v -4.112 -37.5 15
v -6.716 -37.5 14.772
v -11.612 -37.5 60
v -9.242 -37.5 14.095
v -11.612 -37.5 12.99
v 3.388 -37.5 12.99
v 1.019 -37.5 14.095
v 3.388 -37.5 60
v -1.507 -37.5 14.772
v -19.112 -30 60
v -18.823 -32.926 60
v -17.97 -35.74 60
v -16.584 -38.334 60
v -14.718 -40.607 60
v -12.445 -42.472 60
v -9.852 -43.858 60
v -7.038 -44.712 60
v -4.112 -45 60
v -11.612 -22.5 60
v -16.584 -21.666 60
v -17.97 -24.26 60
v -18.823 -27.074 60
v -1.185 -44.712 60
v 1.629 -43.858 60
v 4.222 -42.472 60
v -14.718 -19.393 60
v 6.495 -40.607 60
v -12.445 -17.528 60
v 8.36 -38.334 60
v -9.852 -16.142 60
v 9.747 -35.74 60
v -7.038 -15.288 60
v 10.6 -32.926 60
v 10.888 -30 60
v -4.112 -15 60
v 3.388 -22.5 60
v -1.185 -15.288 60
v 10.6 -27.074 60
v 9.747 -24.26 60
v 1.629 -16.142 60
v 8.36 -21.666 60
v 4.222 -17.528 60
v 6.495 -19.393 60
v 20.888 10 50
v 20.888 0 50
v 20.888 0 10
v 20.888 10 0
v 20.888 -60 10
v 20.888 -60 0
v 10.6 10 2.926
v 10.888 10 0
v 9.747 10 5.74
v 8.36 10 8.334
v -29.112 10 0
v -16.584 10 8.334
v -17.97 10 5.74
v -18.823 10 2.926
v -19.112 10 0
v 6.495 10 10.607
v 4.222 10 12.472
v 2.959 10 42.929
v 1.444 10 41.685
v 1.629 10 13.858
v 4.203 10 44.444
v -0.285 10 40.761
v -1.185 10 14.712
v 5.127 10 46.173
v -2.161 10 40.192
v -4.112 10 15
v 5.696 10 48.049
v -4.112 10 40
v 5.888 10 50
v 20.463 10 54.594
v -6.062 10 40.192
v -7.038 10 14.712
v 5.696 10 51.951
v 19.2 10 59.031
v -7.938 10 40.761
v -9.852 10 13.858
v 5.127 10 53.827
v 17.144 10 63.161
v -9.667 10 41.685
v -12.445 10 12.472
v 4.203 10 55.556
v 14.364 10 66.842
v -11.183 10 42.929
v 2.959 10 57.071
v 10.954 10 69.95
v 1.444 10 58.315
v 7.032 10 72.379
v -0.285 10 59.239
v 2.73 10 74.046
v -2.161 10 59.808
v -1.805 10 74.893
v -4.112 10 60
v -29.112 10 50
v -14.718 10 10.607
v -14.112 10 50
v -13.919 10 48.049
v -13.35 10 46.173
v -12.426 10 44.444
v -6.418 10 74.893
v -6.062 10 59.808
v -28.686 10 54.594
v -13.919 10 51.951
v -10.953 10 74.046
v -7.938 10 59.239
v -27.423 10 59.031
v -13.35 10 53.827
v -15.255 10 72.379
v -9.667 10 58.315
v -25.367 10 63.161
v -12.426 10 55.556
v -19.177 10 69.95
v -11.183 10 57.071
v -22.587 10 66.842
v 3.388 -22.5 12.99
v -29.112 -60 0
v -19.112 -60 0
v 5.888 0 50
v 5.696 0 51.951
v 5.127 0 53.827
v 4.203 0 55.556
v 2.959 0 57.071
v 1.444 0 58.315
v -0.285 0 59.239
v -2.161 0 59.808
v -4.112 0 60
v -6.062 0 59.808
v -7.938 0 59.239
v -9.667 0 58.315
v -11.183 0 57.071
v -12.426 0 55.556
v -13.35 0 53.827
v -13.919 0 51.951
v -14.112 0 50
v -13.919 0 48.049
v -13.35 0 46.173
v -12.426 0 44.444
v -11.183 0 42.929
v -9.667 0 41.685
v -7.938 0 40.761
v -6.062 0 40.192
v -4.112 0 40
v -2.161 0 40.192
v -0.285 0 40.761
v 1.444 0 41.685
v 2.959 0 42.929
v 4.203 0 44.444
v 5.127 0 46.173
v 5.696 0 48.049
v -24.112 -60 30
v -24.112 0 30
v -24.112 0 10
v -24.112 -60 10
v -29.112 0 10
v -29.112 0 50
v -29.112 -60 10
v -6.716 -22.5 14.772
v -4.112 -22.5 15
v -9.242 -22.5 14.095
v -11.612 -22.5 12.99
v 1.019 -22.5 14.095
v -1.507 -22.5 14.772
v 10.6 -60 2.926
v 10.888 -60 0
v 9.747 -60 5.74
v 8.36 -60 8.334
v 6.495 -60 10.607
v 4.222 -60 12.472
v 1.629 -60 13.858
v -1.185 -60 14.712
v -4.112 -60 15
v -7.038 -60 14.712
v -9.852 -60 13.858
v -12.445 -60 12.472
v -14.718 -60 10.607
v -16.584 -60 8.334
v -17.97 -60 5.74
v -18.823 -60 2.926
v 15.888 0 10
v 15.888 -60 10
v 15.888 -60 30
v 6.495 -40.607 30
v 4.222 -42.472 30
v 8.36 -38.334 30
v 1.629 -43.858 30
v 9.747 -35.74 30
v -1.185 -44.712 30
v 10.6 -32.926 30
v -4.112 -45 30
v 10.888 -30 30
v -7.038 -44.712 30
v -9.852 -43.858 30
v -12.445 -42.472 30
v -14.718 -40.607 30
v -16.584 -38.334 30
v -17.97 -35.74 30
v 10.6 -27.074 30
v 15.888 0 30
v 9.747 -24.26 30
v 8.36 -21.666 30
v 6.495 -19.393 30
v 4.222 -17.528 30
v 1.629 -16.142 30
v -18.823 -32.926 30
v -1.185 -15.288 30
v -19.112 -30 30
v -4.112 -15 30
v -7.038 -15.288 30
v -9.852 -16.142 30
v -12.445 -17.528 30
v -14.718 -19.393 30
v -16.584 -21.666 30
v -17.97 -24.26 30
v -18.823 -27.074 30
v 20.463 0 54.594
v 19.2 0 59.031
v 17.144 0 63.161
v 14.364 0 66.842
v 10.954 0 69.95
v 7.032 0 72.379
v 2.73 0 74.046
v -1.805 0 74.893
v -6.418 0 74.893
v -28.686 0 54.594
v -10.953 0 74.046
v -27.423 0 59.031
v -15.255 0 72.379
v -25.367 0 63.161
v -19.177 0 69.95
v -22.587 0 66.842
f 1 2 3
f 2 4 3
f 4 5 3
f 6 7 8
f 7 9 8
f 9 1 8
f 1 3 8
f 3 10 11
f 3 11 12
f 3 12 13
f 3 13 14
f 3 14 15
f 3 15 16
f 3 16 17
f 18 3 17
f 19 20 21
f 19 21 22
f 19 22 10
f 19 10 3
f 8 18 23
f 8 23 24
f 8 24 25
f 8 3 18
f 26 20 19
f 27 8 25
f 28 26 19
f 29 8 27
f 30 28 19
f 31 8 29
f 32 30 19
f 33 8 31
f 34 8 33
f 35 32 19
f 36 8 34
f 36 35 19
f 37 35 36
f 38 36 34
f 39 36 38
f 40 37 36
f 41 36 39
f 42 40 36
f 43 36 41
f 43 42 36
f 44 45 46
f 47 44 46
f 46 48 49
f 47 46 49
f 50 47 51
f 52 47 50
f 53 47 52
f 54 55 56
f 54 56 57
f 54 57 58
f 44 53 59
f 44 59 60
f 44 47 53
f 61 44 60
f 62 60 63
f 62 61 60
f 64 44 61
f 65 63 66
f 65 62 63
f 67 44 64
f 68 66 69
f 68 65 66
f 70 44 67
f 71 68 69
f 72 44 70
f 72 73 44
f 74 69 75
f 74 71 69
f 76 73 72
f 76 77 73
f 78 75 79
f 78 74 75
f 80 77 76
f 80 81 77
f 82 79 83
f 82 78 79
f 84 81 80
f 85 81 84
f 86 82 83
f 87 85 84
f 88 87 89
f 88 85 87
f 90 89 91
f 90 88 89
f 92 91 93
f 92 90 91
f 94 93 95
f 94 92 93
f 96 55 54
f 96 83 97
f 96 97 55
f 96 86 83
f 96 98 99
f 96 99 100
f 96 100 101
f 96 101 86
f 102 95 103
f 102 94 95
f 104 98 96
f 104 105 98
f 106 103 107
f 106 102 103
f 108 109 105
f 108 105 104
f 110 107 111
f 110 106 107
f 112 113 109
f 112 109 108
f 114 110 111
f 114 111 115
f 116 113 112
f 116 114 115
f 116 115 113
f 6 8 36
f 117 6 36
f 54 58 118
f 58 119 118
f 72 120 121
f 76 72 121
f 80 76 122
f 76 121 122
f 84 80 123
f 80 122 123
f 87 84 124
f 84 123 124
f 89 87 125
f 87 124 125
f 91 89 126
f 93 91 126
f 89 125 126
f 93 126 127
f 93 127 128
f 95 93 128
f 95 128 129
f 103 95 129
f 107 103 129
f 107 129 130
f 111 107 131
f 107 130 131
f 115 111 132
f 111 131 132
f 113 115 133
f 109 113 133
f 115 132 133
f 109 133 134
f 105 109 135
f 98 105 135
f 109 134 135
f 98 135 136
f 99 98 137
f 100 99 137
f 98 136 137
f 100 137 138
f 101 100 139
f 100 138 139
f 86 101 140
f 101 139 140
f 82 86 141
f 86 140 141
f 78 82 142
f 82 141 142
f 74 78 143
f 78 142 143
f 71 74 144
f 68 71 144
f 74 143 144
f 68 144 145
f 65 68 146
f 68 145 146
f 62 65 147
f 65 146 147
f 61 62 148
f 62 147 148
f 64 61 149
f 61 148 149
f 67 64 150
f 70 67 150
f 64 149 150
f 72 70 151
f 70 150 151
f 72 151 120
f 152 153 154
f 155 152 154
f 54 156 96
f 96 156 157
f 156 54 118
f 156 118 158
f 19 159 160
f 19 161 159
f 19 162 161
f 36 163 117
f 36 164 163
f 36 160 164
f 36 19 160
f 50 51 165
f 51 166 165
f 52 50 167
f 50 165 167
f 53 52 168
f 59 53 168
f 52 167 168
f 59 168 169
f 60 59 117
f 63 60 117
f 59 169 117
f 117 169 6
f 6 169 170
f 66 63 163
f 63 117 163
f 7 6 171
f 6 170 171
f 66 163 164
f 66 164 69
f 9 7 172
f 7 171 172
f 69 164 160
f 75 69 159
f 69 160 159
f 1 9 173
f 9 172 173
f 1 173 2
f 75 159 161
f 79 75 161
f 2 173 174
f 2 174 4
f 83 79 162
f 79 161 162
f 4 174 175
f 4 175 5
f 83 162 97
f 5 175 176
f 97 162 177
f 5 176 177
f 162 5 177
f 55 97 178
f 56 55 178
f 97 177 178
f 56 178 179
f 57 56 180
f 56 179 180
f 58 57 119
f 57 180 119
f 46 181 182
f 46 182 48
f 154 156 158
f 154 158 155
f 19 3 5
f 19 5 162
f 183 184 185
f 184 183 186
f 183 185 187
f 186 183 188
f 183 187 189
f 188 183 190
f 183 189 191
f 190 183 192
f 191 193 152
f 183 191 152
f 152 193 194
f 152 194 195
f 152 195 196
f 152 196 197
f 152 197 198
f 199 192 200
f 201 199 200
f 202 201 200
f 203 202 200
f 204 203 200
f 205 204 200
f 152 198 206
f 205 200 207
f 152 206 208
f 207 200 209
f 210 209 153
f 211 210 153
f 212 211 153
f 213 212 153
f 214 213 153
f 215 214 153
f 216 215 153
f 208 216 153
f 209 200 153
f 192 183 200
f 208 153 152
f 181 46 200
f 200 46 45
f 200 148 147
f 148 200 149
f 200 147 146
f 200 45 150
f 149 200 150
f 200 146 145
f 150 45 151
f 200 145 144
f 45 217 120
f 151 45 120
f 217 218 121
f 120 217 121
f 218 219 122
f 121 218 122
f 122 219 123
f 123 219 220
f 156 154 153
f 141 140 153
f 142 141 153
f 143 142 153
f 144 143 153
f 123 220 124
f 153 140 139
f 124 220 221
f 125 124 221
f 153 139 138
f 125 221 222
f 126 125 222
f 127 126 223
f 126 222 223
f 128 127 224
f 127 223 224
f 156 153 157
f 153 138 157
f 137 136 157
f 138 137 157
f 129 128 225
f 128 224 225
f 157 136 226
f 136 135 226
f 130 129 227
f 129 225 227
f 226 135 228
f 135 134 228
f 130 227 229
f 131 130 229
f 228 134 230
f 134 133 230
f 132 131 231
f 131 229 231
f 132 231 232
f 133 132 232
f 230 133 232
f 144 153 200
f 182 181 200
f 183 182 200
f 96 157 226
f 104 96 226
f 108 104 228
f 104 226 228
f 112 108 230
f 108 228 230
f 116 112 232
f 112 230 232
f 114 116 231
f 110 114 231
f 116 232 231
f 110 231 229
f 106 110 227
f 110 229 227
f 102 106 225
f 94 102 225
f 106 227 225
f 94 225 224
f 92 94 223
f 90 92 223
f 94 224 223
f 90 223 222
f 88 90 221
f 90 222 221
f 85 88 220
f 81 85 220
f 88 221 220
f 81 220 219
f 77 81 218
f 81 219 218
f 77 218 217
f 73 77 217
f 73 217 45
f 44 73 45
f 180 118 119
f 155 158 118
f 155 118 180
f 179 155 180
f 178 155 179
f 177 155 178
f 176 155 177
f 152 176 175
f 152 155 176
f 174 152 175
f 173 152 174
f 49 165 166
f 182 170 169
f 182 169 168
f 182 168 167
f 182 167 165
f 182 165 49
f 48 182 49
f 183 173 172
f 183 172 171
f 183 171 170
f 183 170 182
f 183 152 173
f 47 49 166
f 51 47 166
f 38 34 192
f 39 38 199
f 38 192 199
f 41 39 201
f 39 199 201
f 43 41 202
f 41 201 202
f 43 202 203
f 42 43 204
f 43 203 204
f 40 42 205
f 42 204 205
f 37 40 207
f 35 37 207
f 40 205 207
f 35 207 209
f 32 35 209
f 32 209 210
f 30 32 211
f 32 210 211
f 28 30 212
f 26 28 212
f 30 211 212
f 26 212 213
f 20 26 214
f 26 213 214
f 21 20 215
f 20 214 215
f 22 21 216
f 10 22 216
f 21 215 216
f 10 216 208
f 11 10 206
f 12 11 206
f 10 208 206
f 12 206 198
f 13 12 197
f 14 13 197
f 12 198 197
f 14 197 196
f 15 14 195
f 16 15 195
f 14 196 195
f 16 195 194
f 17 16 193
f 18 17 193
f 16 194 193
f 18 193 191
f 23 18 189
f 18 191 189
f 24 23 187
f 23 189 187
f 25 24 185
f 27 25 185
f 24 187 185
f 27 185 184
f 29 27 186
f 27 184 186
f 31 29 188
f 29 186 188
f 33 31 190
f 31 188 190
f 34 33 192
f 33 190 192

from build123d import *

# Parameters (mm, degrees)
F0_W     = 5
F0_H     = 10
F1_DEPTH = 60
F3_DEPTH = 10
F4_R     = 15
F5_DEPTH = 30
F6_W     = 15
F6_H     = 15
F7_DEPTH = 70


with BuildPart() as f1:
    # F0 (on Front) → F1 (new body)
    with BuildSketch(Plane.XZ):
        with Locations((-26.611573, 5)):
            Rectangle(F0_W, F0_H)
        with Locations((18.388427, 5)):
            Rectangle(F0_W, F0_H)
        with BuildLine():
            Line((10.888427, 0), (15.888427, 0))
            Line((15.888427, 0), (15.888427, 10))
            Line((15.888427, 10), (15.888427, 30))
            Line((15.888427, 30), (-24.111573, 30))
            Line((-24.111573, 30), (-24.111573, 10))
            Line((-24.111573, 10), (-24.111573, 0))
            Line((-24.111573, 0), (-19.111573, 0))
            ThreePointArc((-19.111573, 0), (-4.111573, 15), (10.888427, 0))
        make_face()
    extrude(amount=F1_DEPTH)

    # F2 (on face) → F3 (join)
    with BuildSketch(Plane(origin=(0, 0, 0), x_dir=(-1, 0, 0), z_dir=(0, 1, 0))):
        with BuildLine():
            Line((-20.888427, 10), (-20.888427, 0))
            Line((-20.888427, 0), (-10.888427, 0))
            ThreePointArc((-10.888427, 0), (4.111573, 15), (19.111573, 0))
            Line((19.111573, 0), (29.111573, 0))
            Line((29.111573, 0), (29.111573, 10))
            Line((29.111573, 10), (24.111573, 10))
            Line((24.111573, 10), (24.111573, 30))
            Line((24.111573, 30), (19.111573, 30))
            ThreePointArc((19.111573, 30), (4.111573, 25), (-10.888427, 30))
            Line((-10.888427, 30), (-15.888427, 30))
            Line((-15.888427, 30), (-15.888427, 10))
            Line((-15.888427, 10), (-20.888427, 10))
        make_face()
        with BuildLine():
            Line((-20.888427, 50), (-20.888427, 10))
            Line((-20.888427, 10), (-15.888427, 10))
            Line((-15.888427, 10), (-15.888427, 30))
            Line((-15.888427, 30), (-10.888427, 30))
            ThreePointArc((-10.888427, 30), (-18.249106, 38.81966), (-20.888427, 50))
        make_face()
        with BuildLine():
            Line((29.111573, 10), (29.111573, 50))
            ThreePointArc((29.111573, 50), (26.472253, 38.81966), (19.111573, 30))
            Line((19.111573, 30), (24.111573, 30))
            Line((24.111573, 30), (24.111573, 10))
            Line((24.111573, 10), (29.111573, 10))
        make_face()
        with BuildLine():
            Line((19.111573, 30), (-10.888427, 30))
            ThreePointArc((-10.888427, 30), (4.111573, 25), (19.111573, 30))
        make_face()
        with BuildLine():
            ThreePointArc((29.111573, 50), (4.111573, 75), (-20.888427, 50))
            Line((-20.888427, 50), (-5.888427, 50))
            ThreePointArc((-5.888427, 50), (4.111573, 60), (14.111573, 50))
            Line((14.111573, 50), (29.111573, 50))
        make_face()
        with BuildLine():
            Line((-5.888427, 50), (-20.888427, 50))
            ThreePointArc((-20.888427, 50), (-18.249106, 38.81966), (-10.888427, 30))
            Line((-10.888427, 30), (19.111573, 30))
            ThreePointArc((19.111573, 30), (26.472253, 38.81966), (29.111573, 50))
            Line((29.111573, 50), (14.111573, 50))
            ThreePointArc((14.111573, 50), (4.111573, 40), (-5.888427, 50))
        make_face()
    extrude(amount=F3_DEPTH)

    # F4 (on face) → F5 (join)
    with BuildSketch(Plane.XY.offset(30)):
        with Locations((-4.111573, -30)):
            Circle(F4_R)
    extrude(amount=F5_DEPTH)

    # F6 (on face) → F7 (cut)
    with BuildSketch(Plane.XY.offset(60)):
        with Locations((-4.111573, -30)):
            Rectangle(F6_W, F6_H)
    extrude(amount=-F7_DEPTH, mode=Mode.SUBTRACT)


solid = f1.part
